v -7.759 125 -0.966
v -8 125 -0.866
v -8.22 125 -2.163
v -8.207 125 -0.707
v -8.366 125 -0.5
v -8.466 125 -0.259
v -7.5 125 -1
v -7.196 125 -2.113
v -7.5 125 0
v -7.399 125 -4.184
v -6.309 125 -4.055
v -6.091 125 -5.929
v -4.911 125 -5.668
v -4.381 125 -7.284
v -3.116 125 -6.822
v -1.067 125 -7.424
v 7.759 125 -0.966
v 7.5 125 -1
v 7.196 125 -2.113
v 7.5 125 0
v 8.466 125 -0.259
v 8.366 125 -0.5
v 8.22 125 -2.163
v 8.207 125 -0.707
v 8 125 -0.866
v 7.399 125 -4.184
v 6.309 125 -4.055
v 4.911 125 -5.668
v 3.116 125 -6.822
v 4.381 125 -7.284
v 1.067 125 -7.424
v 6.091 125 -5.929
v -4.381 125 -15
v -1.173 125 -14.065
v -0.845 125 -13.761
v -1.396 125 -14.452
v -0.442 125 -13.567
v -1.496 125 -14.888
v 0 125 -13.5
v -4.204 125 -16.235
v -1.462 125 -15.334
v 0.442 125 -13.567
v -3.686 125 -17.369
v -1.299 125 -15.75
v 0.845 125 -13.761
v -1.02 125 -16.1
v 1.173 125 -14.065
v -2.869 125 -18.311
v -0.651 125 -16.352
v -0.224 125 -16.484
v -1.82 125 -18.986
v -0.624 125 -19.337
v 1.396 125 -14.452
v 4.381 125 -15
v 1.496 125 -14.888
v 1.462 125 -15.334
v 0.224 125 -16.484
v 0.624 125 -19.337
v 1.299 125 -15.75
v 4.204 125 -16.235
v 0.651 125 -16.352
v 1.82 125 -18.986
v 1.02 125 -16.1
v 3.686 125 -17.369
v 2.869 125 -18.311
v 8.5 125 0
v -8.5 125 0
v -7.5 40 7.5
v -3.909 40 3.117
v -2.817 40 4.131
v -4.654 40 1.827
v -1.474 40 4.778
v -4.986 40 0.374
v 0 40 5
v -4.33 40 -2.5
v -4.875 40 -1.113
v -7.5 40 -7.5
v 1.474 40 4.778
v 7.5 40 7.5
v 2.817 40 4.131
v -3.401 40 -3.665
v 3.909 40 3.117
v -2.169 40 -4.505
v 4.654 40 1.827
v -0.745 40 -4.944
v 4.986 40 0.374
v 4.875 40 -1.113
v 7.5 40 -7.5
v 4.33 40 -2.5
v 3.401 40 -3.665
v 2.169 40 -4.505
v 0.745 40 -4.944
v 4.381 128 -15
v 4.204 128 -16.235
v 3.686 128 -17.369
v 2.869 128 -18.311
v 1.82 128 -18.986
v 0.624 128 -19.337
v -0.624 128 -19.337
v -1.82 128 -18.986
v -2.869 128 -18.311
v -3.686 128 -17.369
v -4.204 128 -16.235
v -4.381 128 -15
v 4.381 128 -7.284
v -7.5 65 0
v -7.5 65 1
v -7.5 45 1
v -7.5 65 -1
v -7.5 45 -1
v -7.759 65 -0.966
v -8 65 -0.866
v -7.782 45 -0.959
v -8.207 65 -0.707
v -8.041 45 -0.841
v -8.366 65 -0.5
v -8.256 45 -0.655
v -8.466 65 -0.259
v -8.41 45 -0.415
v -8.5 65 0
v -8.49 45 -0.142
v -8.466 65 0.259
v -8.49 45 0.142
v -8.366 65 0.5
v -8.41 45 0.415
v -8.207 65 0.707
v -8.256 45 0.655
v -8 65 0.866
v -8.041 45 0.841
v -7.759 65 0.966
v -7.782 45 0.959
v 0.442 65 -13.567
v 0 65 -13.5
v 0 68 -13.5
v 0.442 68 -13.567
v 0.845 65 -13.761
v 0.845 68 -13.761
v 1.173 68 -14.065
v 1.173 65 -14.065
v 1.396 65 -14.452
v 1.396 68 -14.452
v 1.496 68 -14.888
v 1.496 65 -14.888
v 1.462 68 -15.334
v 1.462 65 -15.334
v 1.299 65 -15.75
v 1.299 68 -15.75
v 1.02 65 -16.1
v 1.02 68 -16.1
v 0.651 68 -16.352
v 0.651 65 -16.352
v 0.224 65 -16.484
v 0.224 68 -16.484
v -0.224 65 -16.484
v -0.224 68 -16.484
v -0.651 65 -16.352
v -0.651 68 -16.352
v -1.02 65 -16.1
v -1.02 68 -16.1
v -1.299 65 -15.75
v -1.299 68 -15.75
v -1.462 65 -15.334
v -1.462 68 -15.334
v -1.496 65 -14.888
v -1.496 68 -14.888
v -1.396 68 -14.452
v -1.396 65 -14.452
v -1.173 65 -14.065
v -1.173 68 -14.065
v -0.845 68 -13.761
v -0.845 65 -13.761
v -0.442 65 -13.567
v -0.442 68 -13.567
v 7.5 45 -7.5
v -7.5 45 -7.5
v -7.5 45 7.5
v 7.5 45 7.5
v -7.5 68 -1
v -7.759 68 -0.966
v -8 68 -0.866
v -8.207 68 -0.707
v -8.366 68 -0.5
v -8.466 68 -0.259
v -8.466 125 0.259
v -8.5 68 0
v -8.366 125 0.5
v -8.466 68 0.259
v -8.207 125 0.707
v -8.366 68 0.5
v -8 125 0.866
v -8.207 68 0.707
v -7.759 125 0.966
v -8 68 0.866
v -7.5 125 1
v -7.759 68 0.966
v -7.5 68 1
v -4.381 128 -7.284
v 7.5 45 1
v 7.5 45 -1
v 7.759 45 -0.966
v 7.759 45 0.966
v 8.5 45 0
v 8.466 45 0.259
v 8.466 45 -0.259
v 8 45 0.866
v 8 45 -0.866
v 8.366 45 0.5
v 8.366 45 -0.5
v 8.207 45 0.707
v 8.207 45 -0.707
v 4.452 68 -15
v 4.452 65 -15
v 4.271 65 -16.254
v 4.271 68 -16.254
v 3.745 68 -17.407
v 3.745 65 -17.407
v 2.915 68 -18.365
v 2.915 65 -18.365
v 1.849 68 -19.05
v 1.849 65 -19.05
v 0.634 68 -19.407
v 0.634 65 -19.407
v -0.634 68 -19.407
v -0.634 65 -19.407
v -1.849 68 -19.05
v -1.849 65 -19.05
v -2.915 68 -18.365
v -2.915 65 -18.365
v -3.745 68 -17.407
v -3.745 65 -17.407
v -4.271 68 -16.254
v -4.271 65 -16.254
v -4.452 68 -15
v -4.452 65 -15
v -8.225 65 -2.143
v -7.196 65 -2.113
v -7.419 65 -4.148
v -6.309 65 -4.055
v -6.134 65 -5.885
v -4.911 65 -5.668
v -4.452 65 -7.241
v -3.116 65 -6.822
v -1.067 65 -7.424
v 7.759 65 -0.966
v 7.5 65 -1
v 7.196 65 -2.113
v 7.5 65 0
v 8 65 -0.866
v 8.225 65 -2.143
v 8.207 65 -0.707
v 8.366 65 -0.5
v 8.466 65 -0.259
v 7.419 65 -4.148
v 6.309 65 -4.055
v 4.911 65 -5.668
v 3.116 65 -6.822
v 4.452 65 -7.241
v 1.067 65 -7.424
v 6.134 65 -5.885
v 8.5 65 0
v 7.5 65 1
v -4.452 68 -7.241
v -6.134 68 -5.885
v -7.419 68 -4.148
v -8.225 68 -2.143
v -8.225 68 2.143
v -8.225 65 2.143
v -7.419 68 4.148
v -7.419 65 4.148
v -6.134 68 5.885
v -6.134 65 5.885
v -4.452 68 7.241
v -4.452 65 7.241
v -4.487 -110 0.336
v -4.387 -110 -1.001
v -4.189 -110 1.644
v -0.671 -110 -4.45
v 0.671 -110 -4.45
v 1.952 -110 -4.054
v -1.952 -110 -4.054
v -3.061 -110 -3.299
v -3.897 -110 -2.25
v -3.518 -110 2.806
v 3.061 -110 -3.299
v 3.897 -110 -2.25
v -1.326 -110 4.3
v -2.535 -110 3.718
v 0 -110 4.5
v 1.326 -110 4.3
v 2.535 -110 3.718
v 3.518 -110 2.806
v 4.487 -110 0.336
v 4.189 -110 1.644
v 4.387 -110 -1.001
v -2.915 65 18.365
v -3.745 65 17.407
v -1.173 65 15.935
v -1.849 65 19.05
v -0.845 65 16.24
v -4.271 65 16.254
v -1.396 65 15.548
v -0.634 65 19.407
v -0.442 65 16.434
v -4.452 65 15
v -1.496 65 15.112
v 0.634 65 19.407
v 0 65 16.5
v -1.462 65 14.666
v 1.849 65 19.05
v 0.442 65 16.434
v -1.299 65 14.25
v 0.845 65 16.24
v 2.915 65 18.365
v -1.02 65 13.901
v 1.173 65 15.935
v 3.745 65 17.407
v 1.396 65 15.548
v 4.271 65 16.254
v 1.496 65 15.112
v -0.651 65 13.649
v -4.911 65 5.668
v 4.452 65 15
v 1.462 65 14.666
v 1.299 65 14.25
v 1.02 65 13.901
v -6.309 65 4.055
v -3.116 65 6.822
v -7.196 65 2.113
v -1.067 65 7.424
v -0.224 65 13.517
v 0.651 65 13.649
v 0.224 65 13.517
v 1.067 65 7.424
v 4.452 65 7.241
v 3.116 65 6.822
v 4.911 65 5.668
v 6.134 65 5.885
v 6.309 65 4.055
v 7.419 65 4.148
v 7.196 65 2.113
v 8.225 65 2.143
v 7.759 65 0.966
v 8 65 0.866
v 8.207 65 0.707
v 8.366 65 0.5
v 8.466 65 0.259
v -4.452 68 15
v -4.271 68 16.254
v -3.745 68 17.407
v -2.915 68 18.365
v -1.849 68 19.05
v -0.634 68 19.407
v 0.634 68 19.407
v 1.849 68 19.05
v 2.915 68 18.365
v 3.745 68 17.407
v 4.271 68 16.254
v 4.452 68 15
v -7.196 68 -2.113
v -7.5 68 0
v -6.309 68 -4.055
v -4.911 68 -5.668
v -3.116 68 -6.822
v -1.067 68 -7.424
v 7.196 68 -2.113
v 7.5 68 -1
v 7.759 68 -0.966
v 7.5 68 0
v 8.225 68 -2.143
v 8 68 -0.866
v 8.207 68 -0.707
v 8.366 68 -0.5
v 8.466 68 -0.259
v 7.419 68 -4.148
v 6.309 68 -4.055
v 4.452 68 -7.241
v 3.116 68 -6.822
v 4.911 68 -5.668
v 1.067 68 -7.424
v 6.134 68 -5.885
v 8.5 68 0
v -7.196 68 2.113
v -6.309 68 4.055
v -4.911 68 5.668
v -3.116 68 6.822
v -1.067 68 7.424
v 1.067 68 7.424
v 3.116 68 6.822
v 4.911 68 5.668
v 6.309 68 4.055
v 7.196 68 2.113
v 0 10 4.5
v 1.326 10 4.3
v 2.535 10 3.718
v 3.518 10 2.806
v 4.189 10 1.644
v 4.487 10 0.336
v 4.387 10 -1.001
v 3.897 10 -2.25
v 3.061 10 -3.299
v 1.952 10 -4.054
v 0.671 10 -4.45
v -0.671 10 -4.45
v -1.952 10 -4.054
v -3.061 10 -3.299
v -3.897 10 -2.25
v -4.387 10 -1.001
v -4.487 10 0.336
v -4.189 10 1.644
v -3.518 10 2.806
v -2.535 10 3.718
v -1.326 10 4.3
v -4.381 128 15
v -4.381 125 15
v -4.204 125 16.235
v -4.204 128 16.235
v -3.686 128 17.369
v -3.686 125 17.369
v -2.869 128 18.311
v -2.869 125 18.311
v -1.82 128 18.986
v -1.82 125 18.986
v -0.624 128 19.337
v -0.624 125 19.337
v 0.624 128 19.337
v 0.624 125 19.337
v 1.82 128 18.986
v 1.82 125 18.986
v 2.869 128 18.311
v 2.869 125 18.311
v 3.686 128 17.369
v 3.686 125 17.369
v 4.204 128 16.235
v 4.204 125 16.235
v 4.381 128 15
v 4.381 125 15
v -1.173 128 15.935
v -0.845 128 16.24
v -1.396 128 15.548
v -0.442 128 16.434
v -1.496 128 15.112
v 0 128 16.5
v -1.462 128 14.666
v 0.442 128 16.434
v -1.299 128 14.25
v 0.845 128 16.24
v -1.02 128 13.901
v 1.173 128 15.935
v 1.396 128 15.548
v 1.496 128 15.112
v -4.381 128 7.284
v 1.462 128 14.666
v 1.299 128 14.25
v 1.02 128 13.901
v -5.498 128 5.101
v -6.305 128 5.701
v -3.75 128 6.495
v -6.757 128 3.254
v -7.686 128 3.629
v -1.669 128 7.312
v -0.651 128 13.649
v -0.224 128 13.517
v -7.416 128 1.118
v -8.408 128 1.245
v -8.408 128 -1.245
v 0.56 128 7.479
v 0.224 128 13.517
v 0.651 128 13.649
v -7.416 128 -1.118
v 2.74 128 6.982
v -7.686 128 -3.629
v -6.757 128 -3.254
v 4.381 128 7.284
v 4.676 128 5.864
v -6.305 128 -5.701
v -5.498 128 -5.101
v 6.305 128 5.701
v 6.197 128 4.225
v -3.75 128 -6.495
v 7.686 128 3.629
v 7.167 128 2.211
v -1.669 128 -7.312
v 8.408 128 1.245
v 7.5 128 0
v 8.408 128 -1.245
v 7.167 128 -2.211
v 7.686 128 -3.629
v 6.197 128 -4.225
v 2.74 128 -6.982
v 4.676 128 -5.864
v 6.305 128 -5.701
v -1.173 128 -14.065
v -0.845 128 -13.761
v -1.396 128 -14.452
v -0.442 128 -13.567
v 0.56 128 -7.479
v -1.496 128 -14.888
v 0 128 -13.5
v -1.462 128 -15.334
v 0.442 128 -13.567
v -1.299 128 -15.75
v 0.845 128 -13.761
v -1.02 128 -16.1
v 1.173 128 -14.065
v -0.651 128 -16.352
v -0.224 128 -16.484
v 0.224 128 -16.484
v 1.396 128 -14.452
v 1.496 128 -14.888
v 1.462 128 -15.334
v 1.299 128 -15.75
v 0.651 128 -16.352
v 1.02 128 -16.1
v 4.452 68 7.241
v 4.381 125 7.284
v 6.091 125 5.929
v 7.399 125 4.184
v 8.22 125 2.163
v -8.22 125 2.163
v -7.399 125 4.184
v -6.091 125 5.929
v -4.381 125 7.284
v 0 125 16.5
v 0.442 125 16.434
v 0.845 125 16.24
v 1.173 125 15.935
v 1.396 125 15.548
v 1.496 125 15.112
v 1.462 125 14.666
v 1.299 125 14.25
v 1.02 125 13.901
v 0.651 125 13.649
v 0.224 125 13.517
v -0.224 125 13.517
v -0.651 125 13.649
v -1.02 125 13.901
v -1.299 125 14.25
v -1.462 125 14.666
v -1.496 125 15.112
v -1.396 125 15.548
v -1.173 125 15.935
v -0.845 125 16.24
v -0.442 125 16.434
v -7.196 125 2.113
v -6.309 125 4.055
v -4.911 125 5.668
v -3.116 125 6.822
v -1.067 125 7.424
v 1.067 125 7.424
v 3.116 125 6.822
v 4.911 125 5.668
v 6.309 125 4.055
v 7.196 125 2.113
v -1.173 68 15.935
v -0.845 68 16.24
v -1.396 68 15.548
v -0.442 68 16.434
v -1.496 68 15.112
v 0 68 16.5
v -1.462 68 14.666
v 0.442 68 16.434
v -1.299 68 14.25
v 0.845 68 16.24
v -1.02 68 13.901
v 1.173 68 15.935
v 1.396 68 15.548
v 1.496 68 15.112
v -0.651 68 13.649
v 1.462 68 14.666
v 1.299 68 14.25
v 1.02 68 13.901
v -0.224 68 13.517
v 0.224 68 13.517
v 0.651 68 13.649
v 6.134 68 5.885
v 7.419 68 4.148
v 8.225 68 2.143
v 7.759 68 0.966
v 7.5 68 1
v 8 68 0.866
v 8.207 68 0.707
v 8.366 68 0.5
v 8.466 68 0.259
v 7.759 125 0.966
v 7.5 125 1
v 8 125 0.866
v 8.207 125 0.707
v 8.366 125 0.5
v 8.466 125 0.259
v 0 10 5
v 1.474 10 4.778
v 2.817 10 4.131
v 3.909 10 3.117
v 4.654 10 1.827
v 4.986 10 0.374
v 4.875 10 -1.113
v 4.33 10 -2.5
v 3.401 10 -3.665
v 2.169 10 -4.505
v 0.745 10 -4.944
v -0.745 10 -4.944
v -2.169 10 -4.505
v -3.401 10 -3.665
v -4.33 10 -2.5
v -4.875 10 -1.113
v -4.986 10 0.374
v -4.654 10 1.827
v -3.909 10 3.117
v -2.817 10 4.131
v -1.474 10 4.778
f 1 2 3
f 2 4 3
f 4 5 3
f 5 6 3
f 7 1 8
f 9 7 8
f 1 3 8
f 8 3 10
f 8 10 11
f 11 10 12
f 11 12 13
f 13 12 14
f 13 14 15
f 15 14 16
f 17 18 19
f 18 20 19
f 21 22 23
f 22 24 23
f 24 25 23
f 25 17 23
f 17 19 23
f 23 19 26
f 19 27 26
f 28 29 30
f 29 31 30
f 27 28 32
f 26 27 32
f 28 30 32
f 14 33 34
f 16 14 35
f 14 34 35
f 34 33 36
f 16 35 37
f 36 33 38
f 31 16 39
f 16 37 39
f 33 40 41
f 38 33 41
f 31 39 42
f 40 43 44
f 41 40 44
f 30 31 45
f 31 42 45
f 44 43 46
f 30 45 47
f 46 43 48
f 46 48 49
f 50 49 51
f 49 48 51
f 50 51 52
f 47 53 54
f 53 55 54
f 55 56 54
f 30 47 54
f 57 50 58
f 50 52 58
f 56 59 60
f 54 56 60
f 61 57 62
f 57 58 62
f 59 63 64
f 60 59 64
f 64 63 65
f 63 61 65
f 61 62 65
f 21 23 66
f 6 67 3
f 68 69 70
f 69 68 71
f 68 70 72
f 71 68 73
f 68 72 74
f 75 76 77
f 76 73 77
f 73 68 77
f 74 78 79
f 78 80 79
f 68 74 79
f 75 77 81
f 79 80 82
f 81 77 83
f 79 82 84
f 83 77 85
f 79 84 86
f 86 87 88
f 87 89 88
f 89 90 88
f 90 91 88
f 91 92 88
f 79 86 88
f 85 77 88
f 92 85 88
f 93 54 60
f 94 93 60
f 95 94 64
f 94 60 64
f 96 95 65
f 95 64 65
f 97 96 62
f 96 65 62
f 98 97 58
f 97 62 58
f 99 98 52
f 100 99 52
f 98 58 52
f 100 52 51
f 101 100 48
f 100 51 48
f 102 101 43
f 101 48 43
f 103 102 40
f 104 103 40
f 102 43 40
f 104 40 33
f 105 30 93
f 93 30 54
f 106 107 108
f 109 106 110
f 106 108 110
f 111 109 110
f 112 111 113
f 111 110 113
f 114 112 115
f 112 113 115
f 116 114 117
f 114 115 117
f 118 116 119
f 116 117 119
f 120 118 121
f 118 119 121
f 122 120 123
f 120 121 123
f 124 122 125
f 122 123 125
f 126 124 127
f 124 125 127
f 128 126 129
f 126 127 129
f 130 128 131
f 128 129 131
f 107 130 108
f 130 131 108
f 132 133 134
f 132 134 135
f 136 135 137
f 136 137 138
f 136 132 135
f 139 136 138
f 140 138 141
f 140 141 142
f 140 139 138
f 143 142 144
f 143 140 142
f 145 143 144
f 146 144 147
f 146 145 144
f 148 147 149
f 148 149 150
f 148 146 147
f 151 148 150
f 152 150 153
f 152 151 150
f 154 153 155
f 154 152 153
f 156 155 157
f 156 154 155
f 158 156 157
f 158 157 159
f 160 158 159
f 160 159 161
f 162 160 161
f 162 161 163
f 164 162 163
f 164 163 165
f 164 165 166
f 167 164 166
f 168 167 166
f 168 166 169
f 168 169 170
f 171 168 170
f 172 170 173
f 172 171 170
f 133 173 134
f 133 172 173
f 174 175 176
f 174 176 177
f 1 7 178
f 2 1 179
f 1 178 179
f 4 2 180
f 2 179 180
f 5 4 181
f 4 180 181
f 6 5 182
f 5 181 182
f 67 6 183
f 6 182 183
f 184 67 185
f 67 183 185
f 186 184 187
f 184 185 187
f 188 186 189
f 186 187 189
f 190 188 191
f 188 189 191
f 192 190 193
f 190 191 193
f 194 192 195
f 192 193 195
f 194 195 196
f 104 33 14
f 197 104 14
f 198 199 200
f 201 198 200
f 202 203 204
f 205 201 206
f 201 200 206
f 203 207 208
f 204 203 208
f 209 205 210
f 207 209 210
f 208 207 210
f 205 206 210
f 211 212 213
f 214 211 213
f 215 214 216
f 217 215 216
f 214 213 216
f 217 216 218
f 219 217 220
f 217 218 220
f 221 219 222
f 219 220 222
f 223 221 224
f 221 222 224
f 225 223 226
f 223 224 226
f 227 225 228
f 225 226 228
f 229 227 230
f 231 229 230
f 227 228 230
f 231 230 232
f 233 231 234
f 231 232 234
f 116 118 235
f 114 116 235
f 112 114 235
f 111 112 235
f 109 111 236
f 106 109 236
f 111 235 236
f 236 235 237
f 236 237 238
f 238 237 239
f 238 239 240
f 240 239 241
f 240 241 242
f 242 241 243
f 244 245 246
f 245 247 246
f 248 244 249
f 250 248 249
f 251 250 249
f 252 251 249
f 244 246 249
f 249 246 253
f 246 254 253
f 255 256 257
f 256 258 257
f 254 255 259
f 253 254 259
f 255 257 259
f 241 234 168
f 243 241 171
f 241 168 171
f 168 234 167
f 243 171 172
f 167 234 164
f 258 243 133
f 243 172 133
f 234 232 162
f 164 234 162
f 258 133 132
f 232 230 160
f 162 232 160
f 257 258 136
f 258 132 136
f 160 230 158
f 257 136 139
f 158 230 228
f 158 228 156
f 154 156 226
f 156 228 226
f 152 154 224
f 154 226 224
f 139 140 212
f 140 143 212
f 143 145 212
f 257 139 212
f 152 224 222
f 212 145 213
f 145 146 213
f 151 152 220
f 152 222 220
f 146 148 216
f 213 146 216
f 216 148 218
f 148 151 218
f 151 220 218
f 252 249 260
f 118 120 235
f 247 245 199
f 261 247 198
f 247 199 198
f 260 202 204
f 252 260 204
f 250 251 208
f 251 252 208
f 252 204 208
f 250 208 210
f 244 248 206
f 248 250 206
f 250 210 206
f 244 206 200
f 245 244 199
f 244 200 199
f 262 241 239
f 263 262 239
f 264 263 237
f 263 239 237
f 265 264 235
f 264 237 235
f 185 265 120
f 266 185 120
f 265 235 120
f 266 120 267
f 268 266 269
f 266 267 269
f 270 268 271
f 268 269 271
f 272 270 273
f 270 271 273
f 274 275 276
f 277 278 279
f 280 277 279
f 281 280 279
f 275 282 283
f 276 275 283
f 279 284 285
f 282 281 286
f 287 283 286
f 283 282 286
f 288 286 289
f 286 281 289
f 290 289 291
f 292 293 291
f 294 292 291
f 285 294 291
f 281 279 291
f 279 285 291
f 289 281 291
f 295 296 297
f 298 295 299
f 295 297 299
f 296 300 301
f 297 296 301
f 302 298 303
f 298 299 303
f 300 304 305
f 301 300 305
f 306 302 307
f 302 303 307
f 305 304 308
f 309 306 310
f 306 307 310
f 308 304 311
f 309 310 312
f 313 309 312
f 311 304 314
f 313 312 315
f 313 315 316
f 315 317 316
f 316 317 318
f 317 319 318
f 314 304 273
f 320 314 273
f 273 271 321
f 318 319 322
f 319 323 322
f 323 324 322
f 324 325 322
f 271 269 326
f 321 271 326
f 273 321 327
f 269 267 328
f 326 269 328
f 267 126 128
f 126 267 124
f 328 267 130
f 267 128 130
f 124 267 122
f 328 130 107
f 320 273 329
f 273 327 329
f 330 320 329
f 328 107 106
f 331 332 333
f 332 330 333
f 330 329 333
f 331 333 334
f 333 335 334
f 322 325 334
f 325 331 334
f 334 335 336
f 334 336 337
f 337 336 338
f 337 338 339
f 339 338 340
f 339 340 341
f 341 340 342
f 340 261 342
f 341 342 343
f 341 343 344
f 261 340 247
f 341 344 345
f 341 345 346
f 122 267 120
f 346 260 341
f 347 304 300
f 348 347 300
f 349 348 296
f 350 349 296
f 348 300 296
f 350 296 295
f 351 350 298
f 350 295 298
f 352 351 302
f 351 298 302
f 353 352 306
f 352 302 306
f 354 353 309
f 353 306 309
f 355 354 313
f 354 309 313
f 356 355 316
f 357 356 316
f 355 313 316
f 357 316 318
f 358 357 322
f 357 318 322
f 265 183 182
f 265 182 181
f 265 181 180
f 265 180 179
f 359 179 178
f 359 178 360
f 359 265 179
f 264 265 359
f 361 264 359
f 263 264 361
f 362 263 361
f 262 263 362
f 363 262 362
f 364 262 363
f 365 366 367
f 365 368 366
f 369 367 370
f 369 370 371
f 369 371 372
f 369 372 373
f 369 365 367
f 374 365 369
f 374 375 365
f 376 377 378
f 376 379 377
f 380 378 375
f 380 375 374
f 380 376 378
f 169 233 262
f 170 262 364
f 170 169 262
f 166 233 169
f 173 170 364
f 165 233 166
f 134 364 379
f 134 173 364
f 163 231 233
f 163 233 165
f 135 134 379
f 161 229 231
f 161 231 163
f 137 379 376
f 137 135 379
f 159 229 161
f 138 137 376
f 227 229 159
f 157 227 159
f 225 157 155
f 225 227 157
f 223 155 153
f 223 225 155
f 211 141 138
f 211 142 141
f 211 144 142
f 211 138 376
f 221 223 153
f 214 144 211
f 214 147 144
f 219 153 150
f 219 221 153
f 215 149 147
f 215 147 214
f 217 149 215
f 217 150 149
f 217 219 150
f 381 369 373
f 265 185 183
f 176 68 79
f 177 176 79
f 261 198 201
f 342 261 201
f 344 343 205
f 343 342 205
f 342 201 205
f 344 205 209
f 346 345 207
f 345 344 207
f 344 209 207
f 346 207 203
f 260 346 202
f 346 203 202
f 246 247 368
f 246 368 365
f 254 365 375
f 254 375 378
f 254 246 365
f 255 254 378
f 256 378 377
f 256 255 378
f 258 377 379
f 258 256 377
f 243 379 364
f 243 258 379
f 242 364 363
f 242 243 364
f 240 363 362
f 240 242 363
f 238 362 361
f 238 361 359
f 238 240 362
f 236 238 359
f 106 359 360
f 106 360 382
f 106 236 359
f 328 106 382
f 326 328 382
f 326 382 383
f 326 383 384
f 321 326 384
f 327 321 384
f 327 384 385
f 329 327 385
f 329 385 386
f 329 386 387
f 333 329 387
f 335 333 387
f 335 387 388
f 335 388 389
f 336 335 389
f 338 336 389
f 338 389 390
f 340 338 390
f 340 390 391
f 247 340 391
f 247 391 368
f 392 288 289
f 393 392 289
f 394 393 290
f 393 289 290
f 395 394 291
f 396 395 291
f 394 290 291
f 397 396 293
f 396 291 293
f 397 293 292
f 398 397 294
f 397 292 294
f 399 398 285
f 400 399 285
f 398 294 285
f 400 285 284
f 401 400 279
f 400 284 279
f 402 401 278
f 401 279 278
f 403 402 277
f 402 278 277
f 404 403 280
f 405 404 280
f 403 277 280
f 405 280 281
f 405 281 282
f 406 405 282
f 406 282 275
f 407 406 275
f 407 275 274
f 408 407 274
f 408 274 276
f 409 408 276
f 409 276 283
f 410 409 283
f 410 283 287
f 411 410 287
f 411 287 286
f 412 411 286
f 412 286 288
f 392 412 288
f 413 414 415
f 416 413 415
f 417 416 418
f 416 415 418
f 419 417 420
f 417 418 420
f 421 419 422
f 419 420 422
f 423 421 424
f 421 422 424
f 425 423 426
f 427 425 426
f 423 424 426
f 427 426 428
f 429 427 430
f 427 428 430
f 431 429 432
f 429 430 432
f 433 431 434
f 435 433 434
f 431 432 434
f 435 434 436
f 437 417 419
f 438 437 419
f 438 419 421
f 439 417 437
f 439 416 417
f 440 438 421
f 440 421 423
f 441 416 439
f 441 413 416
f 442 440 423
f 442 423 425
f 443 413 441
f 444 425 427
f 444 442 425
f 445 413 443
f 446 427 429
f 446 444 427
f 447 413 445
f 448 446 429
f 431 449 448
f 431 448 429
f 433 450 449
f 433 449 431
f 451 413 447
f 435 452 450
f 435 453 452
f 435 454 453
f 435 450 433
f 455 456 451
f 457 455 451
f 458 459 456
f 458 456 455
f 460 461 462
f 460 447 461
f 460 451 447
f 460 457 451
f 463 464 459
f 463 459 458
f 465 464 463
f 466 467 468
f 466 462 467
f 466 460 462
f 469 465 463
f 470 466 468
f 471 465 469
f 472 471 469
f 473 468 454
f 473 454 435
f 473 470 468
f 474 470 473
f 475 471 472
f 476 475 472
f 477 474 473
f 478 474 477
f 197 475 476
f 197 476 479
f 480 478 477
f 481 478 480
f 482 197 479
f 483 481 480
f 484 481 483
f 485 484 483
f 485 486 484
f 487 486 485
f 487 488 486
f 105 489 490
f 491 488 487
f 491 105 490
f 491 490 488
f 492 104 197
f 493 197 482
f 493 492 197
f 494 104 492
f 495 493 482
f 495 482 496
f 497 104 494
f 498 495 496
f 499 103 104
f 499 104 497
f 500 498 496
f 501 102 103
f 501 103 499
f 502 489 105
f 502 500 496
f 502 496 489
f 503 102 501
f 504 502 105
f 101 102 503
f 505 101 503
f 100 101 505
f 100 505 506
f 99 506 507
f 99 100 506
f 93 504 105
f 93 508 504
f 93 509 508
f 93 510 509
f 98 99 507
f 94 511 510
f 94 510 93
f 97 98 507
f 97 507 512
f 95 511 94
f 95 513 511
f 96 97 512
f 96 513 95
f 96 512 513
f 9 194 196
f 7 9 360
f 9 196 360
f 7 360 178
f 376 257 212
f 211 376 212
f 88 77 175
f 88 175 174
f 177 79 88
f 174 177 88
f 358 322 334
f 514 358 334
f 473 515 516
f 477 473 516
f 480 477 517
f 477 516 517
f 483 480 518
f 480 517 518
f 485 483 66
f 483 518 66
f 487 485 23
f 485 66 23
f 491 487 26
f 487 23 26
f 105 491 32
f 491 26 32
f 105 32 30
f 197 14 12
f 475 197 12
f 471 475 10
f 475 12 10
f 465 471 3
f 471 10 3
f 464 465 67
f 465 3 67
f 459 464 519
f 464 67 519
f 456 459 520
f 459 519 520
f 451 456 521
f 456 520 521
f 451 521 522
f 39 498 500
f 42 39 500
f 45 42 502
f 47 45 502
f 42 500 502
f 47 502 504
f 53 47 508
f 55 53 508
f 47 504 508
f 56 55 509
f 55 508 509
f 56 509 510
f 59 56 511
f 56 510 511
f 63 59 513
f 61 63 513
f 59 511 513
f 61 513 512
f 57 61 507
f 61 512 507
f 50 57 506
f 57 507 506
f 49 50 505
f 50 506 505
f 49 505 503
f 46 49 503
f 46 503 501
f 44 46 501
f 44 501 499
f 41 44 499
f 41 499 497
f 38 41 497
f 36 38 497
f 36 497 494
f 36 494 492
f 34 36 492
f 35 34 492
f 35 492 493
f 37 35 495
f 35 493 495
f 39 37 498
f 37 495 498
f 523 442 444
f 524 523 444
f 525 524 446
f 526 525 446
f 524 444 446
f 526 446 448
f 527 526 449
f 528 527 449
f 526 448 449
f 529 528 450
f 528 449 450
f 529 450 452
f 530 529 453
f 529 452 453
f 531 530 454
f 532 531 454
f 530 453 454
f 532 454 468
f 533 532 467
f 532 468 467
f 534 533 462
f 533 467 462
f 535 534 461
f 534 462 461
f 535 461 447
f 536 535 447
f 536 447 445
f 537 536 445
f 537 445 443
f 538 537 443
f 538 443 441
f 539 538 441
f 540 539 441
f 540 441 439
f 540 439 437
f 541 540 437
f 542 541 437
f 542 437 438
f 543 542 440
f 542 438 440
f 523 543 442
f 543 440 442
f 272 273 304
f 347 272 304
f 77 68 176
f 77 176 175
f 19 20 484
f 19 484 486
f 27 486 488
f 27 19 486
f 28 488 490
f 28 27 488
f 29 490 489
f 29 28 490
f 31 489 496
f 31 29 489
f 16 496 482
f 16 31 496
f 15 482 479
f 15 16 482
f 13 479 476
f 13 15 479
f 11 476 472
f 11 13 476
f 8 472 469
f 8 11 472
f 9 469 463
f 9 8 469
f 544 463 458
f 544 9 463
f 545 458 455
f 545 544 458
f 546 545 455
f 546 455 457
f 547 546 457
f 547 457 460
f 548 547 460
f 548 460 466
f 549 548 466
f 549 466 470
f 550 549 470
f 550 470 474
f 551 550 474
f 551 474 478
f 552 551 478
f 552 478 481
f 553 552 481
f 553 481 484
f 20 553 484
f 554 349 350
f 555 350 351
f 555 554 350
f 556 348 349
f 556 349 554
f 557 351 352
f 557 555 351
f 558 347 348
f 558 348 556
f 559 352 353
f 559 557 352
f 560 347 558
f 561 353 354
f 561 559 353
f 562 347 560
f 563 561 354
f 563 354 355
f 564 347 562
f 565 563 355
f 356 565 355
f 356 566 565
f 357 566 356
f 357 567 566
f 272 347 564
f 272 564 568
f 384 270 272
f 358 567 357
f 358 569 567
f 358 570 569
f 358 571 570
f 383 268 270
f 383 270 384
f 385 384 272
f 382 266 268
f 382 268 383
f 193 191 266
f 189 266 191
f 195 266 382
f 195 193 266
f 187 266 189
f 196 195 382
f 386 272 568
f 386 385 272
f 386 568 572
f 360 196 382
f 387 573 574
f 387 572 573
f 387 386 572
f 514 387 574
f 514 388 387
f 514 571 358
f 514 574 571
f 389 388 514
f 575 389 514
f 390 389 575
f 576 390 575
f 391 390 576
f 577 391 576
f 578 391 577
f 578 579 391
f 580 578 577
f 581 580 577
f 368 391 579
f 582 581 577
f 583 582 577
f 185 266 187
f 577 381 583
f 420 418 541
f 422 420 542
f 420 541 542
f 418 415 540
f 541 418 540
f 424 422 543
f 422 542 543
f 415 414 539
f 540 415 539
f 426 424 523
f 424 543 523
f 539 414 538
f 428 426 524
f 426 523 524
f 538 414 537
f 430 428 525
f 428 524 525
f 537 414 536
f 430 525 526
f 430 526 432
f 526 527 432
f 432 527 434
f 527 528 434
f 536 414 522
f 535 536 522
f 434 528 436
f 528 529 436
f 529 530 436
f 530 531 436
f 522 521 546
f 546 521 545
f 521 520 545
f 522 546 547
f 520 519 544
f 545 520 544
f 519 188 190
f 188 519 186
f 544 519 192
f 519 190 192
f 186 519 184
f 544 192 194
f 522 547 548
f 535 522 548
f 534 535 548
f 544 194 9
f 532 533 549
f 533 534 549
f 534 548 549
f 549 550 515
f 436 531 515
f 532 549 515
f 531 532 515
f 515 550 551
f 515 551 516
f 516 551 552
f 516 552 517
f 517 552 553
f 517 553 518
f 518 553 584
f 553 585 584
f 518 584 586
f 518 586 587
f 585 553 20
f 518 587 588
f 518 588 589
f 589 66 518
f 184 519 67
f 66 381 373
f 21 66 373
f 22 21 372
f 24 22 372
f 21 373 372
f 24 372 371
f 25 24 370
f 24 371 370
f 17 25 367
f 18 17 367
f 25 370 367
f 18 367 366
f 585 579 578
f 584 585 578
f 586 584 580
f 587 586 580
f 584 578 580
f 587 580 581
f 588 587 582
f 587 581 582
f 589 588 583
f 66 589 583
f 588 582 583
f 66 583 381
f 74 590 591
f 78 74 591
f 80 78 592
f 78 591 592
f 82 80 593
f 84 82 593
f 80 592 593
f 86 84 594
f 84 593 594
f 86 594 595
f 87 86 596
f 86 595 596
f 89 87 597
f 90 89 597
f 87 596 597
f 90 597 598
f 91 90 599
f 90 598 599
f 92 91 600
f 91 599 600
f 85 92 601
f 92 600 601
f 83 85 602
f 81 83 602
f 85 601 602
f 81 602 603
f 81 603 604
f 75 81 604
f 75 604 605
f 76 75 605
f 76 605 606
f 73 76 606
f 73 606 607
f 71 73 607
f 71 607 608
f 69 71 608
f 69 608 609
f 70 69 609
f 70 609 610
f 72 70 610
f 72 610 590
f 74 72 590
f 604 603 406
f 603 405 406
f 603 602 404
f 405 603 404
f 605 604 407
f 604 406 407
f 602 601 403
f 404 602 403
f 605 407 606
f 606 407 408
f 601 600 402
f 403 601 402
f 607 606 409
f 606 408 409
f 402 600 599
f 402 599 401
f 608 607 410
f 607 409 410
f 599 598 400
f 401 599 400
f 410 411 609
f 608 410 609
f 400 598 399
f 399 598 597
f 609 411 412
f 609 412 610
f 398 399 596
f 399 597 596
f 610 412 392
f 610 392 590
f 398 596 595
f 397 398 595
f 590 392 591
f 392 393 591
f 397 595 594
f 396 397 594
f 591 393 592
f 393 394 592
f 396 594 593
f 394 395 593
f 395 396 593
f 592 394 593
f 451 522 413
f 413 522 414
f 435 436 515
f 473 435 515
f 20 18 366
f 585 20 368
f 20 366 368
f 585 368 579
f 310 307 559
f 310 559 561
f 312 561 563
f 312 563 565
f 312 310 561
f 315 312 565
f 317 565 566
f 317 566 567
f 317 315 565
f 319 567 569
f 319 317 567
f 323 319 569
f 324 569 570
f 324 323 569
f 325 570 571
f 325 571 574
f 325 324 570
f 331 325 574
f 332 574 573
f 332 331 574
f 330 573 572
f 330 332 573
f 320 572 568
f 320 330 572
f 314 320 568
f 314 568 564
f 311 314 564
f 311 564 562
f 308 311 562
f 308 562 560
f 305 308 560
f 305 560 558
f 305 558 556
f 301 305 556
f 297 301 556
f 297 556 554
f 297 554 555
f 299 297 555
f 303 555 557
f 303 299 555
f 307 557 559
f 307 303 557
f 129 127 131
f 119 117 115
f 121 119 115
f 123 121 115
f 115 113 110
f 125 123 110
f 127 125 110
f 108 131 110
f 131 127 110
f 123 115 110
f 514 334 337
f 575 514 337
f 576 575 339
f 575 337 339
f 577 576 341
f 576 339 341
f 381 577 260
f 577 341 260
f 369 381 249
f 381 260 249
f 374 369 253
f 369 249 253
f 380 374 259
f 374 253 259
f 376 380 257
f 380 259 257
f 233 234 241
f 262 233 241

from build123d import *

# Parameters (mm, degrees)
SKETCH1_R             = 5
BOSS_EXTRUDE2_DEPTH   = 40
SKETCH2_R             = 5
SKETCH2_R_2           = 4.5
CUT_EXTRUDE1_DEPTH    = 10
SKETCH3_W             = 15
SKETCH3_H             = 15
BOSS_EXTRUDE3_DEPTH   = 5
BOSS_EXTRUDE4_DEPTH   = 80
BOSS_EXTRUDE4_2_DEPTH = 80
SKETCH5_R             = 8.5
SKETCH5_R_2           = 7.5
BOSS_EXTRUDE5_DEPTH   = 3
SKETCH6_R             = 1.5
BOSS_EXTRUDE6_DEPTH   = 3
BOSS_EXTRUDE7_START   = -110
SKETCH7_R             = 4.5
BOSS_EXTRUDE7_DEPTH   = 110
SKETCH8_R             = 7.5
BOSS_EXTRUDE8_DEPTH   = 3
SKETCH10_R            = 1.5
CUT_EXTRUDE2_DEPTH    = 3


with BuildPart() as part:
    # Sketch1 → Boss-Extrude2 (new body)
    with BuildSketch(Plane(origin=(0, 0, 0), x_dir=(1, 0, 0), z_dir=(0, 1, 0))):
        with Locations(Location((0, 0, 0), (0, 0, 270))):
            Circle(SKETCH1_R)
    extrude(amount=BOSS_EXTRUDE2_DEPTH)

    # Sketch2 → Cut-Extrude1 (cut)
    with BuildSketch(Plane(origin=(0, 0, 0), x_dir=(1, 0, 0), z_dir=(0, 1, 0))):
        with Locations(Location((0, 0, 0), (0, 0, 270))):
            Circle(SKETCH2_R)
        with Locations(Location((0, 0, 0), (0, 0, 270))):
            Circle(SKETCH2_R_2, mode=Mode.SUBTRACT)
    extrude(amount=CUT_EXTRUDE1_DEPTH, mode=Mode.SUBTRACT)

    # Sketch3 → Boss-Extrude3 (add)
    with BuildSketch(Plane(origin=(0, 40, 0), x_dir=(1, 0, 0), z_dir=(0, 1, 0))):
        Rectangle(SKETCH3_W, SKETCH3_H)
    extrude(amount=BOSS_EXTRUDE3_DEPTH)

    # Sketch7 → Boss-Extrude7 (add)
    with BuildSketch(Plane(origin=(0, 0, 0), x_dir=(1, 0, 0), z_dir=(0, 1, 0)).offset(BOSS_EXTRUDE7_START)):
        with Locations(Location((0, 0, 0), (0, 0, 270))):
            Circle(SKETCH7_R)
    extrude(amount=BOSS_EXTRUDE7_DEPTH)


with BuildPart() as body_2:
    # Sketch4 → Boss-Extrude4 (new body)
    with BuildSketch(Plane(origin=(0, 45, 0), x_dir=(1, 0, 0), z_dir=(0, 1, 0))):
        with BuildLine():
            Line((-7.5, -1), (-7.5, 1))
            ThreePointArc((-7.5, 1), (-8.5, 0), (-7.5, -1))
        make_face()
    extrude(amount=BOSS_EXTRUDE4_DEPTH)



with BuildPart() as body_3:
    # Sketch4 → Boss-Extrude4 2 (new body)
    with BuildSketch(Plane(origin=(0, 45, 0), x_dir=(1, 0, 0), z_dir=(0, 1, 0))):
        with BuildLine():
            ThreePointArc((8.5, 0), (8.207106781, 0.707106781), (7.5, 1))
            Line((7.5, 1), (7.5, -1))
            ThreePointArc((7.5, -1), (8.207106781, -0.707106781), (8.5, 0))
        make_face()
    extrude(amount=BOSS_EXTRUDE4_2_DEPTH)


with BuildPart() as body_2_1:
    add(body_2.part)

    add(body_3.part)  # Boss-Extrude5 merges body 3
    # Sketch5 → Boss-Extrude5 (add)
    with BuildSketch(Plane(origin=(0, 65, 0), x_dir=(1, 0, 0), z_dir=(0, 1, 0))):
        Circle(SKETCH5_R)
        Circle(SKETCH5_R_2, mode=Mode.SUBTRACT)
    extrude(amount=BOSS_EXTRUDE5_DEPTH)

    # Sketch6 → Boss-Extrude6 (add)
    # profile 1 of 2: a face of its own
    with BuildSketch(Plane(origin=(0, 65, 0), x_dir=(1, 0, 0), z_dir=(0, 1, 0))):
        with BuildLine():
            Line((-4.451682778, -7.241030344), (-4.451682778, -15.000257079))
            ThreePointArc((-4.451682778, -15.000257079), (0, -19.451939857), (4.451682778, -15.000257079))
            Line((4.451682778, -15.000257079), (4.451682778, -7.241030344))
            ThreePointArc((4.451682778, -7.241030344), (0, -8.5), (-4.451682778, -7.241030344))
        make_face()
        with Locations(Location((0, -15.000257079, 0), (0, 0, 270))):
            Circle(SKETCH6_R, mode=Mode.SUBTRACT)
    # profile 2 of 2: a face of its own
    with BuildSketch(Plane(origin=(0, 65, 0), x_dir=(1, 0, 0), z_dir=(0, 1, 0))):
        with BuildLine():
            Line((-4.451682778, 15.000257079), (-4.451682778, 7.241030344))
            ThreePointArc((-4.451682778, 7.241030344), (0, 8.5), (4.451682778, 7.241030344))
            Line((4.451682778, 7.241030344), (4.451682778, 15.000257079))
            ThreePointArc((4.451682778, 15.000257079), (0, 19.451939857), (-4.451682778, 15.000257079))
        make_face()
        with Locations(Location((0, 15.000257079, 0), (0, 0, 270))):
            Circle(SKETCH6_R, mode=Mode.SUBTRACT)
    extrude(amount=BOSS_EXTRUDE6_DEPTH)

    # Sketch8 → Boss-Extrude8 (add)
    with BuildSketch(Plane(origin=(0, 125, 0), x_dir=(1, 0, 0), z_dir=(0, 1, 0))):
        with BuildLine():
            ThreePointArc((4.381351245, -7.283801293), (8.5, 0), (4.381351245, 7.283801293))
            Line((4.381351245, 7.283801293), (4.381351245, 15.000257079))
            ThreePointArc((4.381351245, 15.000257079), (0, 19.381608324), (-4.381351245, 15.000257079))
            Line((-4.381351245, 15.000257079), (-4.381351245, 7.283801293))
            ThreePointArc((-4.381351245, 7.283801293), (-8.5, 0), (-4.381351245, -7.283801293))
            Line((-4.381351245, -7.283801293), (-4.381351245, -15.000257079))
            ThreePointArc((-4.381351245, -15.000257079), (0, -19.381608324), (4.381351245, -15.000257079))
            Line((4.381351245, -15.000257079), (4.381351245, -7.283801293))
        make_face()
        Circle(SKETCH8_R, mode=Mode.SUBTRACT)
    extrude(amount=BOSS_EXTRUDE8_DEPTH)

    # Sketch10 → Cut-Extrude2 (cut)
    with BuildSketch(Plane(origin=(0, 128, 0), x_dir=(1, 0, 0), z_dir=(0, 1, 0))):
        with Locations(Location((0, -15.000257079, 0), (0, 0, 270))):
            Circle(SKETCH10_R)
        with Locations(Location((0, 15.000257079, 0), (0, 0, 270))):
            Circle(SKETCH10_R)
    extrude(amount=-CUT_EXTRUDE2_DEPTH, mode=Mode.SUBTRACT)


solid = Compound([part.part, body_2_1.part])
